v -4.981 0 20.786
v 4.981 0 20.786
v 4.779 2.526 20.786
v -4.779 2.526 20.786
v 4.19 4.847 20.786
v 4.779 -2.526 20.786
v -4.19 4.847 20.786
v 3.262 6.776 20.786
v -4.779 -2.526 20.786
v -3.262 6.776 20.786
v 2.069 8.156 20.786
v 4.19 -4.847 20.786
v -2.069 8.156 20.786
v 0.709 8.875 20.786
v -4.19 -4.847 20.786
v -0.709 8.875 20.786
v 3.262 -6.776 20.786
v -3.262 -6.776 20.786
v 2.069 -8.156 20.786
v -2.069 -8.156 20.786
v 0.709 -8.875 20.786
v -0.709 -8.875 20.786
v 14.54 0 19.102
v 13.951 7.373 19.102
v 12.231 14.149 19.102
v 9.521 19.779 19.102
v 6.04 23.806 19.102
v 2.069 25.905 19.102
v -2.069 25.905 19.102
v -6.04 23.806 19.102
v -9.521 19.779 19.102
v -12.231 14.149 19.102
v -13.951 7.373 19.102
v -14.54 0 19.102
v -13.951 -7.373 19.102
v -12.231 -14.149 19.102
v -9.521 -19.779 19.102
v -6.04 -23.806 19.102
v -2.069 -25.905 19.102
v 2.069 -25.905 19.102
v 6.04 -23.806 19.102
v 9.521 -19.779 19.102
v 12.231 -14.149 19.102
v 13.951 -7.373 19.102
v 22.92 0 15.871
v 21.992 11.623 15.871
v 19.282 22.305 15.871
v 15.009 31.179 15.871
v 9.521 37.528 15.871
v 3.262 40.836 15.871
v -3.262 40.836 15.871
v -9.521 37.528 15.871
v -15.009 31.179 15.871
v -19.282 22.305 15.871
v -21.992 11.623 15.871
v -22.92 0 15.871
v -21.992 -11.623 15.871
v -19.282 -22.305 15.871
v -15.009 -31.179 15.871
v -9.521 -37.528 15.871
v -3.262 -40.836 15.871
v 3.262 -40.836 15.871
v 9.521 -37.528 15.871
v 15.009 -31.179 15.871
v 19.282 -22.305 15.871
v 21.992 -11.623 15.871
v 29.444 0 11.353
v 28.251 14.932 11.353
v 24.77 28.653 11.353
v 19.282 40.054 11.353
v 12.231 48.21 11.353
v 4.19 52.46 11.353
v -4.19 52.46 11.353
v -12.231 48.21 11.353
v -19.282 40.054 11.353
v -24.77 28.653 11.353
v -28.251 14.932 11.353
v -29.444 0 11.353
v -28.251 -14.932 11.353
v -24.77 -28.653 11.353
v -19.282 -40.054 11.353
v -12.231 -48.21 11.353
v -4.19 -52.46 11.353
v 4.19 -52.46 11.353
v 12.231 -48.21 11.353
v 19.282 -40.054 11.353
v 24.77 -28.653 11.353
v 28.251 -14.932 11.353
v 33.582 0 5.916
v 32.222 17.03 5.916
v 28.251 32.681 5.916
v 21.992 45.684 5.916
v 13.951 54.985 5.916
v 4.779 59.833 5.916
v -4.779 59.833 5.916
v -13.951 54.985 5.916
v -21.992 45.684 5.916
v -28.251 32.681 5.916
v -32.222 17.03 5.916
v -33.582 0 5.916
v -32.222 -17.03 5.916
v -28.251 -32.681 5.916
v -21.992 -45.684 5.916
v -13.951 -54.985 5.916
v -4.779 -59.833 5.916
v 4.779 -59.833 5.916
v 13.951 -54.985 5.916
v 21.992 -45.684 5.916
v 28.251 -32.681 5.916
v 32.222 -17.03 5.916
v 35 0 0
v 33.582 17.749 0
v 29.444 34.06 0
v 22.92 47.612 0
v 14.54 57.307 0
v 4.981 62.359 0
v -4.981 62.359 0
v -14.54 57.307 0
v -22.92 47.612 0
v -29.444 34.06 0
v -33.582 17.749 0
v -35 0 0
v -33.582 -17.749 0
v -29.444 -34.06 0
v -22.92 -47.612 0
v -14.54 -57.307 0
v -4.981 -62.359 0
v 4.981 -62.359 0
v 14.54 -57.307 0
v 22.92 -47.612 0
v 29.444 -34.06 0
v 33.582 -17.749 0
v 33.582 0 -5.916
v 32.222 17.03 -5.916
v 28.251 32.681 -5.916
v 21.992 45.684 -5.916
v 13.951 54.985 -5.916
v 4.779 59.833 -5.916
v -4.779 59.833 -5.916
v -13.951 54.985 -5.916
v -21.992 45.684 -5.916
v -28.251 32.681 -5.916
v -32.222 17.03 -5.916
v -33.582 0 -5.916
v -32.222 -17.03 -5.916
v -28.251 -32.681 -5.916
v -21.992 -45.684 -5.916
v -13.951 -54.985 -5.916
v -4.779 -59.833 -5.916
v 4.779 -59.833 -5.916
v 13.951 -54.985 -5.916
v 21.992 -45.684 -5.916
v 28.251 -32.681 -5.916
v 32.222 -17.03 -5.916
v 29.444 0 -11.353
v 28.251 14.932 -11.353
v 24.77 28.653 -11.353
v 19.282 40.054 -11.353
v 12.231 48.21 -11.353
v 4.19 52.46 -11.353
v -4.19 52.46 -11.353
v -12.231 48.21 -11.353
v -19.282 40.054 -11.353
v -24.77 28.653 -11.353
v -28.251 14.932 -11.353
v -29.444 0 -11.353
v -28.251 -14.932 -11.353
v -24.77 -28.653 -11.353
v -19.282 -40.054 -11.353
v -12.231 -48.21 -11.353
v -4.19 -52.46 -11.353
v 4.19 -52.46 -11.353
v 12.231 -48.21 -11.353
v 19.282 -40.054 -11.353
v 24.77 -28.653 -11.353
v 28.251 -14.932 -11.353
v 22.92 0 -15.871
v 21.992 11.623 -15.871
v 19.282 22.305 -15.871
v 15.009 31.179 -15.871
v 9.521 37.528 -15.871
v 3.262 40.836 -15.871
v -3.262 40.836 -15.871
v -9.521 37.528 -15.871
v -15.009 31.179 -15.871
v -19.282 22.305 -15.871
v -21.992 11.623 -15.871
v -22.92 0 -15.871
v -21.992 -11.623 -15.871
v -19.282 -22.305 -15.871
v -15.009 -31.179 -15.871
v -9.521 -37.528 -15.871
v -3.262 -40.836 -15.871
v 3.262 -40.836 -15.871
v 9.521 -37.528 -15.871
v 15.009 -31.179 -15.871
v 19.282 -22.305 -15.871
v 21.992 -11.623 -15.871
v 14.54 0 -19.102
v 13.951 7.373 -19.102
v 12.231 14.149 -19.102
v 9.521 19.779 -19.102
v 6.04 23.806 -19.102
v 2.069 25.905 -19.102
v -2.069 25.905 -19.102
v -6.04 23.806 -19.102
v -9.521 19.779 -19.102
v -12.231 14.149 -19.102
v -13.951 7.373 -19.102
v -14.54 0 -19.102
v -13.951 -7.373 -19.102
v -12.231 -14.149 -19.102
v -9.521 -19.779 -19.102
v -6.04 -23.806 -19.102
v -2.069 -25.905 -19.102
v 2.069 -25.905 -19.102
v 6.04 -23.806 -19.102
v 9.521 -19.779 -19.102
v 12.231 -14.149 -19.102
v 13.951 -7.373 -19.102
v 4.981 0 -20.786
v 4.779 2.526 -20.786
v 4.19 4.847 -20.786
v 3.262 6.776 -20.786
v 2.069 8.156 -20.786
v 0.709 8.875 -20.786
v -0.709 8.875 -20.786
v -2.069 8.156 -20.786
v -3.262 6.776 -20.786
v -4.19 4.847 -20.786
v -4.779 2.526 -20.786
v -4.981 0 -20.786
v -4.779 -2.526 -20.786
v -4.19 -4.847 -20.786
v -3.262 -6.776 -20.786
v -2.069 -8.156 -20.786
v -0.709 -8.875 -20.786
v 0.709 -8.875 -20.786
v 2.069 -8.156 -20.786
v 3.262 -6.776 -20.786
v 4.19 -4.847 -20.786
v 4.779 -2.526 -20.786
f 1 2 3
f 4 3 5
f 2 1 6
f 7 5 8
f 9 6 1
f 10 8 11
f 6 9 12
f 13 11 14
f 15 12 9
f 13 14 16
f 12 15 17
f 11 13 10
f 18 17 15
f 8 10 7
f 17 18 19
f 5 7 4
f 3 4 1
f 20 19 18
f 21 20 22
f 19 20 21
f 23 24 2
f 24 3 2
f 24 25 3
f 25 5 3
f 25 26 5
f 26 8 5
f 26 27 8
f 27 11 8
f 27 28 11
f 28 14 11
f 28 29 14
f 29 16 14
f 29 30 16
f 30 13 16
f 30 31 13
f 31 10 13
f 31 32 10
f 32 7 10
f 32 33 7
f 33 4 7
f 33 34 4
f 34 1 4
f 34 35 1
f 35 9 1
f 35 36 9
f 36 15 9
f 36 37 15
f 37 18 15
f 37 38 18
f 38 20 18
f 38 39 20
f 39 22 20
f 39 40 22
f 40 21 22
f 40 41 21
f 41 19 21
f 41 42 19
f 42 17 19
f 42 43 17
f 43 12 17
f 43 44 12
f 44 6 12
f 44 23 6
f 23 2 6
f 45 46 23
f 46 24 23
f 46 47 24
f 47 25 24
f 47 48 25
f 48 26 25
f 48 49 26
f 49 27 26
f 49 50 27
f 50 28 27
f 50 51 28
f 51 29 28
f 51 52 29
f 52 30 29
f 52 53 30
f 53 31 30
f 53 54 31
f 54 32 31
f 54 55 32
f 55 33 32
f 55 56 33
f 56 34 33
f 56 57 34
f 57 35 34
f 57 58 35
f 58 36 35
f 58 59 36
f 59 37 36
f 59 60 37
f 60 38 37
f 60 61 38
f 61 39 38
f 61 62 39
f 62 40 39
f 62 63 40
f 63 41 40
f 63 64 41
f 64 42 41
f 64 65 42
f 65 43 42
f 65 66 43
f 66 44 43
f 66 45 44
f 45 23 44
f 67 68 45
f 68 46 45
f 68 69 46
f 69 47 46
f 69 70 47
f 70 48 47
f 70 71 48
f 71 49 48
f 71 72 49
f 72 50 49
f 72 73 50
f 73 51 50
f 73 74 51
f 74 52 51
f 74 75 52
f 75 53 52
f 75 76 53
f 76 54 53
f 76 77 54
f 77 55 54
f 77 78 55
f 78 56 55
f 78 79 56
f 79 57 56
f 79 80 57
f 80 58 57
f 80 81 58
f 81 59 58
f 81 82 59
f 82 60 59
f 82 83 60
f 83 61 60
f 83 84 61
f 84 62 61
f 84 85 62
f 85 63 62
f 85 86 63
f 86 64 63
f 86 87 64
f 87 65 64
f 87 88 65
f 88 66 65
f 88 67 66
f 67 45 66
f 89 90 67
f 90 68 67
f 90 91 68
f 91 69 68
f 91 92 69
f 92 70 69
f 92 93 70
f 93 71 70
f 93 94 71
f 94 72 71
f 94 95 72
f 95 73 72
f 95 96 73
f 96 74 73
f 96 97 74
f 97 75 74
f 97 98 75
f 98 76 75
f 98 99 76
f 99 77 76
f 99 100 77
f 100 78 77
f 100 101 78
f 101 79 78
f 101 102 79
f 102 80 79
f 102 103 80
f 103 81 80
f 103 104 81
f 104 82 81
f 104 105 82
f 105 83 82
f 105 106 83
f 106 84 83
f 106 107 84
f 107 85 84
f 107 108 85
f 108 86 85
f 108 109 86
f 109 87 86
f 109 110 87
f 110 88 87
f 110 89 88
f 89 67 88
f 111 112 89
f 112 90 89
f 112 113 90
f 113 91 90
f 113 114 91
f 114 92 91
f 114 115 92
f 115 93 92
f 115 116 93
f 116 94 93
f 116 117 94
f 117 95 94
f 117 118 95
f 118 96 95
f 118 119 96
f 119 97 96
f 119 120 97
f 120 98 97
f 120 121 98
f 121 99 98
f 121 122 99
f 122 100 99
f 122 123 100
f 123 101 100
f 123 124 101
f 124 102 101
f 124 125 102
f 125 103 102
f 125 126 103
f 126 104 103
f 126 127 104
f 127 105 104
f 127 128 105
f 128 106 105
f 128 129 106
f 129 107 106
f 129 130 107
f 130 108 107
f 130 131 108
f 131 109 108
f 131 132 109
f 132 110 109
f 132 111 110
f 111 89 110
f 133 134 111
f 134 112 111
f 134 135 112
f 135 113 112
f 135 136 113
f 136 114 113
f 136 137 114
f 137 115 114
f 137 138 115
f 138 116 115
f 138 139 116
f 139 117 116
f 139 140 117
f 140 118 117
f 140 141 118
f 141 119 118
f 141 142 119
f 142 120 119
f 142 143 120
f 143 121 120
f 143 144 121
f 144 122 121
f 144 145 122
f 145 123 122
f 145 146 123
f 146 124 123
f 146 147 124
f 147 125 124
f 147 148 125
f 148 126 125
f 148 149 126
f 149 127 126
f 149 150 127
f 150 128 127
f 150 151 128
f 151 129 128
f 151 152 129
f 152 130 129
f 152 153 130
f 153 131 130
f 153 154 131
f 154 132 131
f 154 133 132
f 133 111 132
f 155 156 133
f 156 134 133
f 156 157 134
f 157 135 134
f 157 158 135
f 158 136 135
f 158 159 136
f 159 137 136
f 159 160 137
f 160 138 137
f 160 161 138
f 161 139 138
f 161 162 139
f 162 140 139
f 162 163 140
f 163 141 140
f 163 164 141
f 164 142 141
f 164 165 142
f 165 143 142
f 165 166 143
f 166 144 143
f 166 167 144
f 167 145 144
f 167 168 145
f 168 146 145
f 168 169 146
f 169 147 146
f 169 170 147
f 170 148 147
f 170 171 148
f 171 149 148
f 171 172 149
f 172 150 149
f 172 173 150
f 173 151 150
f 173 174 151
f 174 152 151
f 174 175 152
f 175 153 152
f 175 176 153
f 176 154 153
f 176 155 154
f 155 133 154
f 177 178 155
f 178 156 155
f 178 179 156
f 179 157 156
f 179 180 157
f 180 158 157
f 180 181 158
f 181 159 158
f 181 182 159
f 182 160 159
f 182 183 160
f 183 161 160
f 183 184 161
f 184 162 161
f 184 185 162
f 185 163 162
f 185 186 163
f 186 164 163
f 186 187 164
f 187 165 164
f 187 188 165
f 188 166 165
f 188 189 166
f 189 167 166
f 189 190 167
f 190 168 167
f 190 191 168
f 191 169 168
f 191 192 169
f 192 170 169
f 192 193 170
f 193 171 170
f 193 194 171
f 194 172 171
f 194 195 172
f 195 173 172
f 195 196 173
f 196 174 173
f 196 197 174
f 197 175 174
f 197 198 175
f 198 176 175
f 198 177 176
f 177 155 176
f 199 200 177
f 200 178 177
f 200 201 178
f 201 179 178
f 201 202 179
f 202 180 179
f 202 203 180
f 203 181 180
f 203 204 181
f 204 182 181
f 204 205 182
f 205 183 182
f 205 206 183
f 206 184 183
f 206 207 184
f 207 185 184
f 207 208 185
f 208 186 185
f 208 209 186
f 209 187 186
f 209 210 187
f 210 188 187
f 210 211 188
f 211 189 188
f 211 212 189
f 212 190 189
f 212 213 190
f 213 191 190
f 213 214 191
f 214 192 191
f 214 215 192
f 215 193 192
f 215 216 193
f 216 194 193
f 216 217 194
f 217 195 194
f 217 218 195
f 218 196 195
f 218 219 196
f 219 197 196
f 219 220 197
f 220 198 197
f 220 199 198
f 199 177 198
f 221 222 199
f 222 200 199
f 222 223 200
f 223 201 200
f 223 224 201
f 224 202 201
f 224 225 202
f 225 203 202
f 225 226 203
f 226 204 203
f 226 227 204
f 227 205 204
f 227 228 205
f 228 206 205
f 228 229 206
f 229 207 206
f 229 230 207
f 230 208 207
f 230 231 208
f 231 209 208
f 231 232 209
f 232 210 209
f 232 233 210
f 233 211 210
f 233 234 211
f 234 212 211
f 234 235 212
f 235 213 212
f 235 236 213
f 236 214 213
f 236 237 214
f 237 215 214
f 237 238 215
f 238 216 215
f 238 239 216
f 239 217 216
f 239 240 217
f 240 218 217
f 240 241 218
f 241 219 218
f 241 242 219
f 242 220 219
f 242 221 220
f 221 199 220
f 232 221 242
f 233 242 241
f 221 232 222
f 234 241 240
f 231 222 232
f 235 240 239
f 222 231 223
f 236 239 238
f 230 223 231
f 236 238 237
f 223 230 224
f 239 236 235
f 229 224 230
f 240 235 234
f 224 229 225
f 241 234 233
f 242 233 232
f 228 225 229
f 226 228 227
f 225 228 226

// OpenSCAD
// Generated by SolidPython 1.0.1 on 2020-07-29 00:46:46


scale(v = [5, 9, 3]) {
	sphere(r = 7);
}
/***********************************************
*********      SolidPython code:      **********
************************************************
 
# import packages: SolidPython
from solid import *
from solid.utils import *
from itertools import chain, combinations, permutations


class Resize:

    def __init__(self, scad_file):
        self.scad_file = scad_file
        #self.scad_file = import_scad(scad_file)
        # cone/cylinder param:
        self.r1 = 0
        self.r2 = 0
        self.h = 0
        # rectangular prism param:
        self.w = 0
        self.l = 0
        # ellipse param:
        self.r = 0

    # import OpenScad code (file name corresponds to shape)


    # classify shape + parameters
    def assign(self, param1, param2, param3):
        if self.scad_file == 'cone.scad':
            self.r1 = param1
            self.r2 = param2
            self.h = param3
        elif self.scad_file == 'cylinder.scad':
            self.r1 = param1
            self.r2 = param2
            self.h = param3
        elif self.scad_file == 'rectangularPrism.scad':
            self.h = param1
            self.l = param2
            self.w = param3
        else:
            self.r = param1
            self.h = param2

    # resize parameters
    def iterate(self):
        x = range(3, 20, 2)
        i = 1
        if self.scad_file == 'cone.scad':
            tempList = list(permutations(x, 2))
            for temp in tempList:
                param1 = temp[0]
                param2 = temp[1]
                filepath = 'produced_scad_files/' + 'cone' + str(param1) + '_' + str(param2) + '_' + '.scad'
                scad_render_to_file(cylinder(h=param1, r1=param2, r2=0), filepath)

        elif self.scad_file == 'cylinder.scad':
            tempList = list(permutations(x, 3))
            for temp in tempList:
                param1 = temp[0]
                param2 = temp[1]
                filepath = 'produced_scad_files/' + 'cylinder' + str(param1) + '_' + str(param2) + '_' + '.scad'
                scad_render_to_file(cylinder(h=param1, r1=param2, r2=param2), filepath)

        elif self.scad_file == 'rectangularPrism.scad':
            tempList = list(permutations(x, 3))
            for temp in tempList:
                param1 = temp[0]
                param2 = temp[1]
                param3 = temp[2]
                filepath = 'produced_scad_files/' + 'rectangularPrism' + str(param1) + '_' + str(param2) + '_' + str(
                    param3) + '.scad'
                scad_render_to_file(cube(size=(param1, param2, param3)), filepath)

        elif self.scad_file == 'ellipse.scad':
            tempList = list(permutations(x, 4))
            for temp in tempList:
                param1 = temp[0]
                param2 = temp[1]
                param3 = temp[2]
                param4 = temp[3]
                filepath = 'produced_scad_files/' + 'ellipse' + str(param1) + '_' + str(param2) + '_' + str(param3) + '_' + str(param4) + '.scad'
                scad_render_to_file(scale([param1, param2, param3])(sphere(r=param4)), filepath)

    def render_to_scadfile(self):
        scad_render_to_file(scad, 'example.scad') 
 
************************************************/
